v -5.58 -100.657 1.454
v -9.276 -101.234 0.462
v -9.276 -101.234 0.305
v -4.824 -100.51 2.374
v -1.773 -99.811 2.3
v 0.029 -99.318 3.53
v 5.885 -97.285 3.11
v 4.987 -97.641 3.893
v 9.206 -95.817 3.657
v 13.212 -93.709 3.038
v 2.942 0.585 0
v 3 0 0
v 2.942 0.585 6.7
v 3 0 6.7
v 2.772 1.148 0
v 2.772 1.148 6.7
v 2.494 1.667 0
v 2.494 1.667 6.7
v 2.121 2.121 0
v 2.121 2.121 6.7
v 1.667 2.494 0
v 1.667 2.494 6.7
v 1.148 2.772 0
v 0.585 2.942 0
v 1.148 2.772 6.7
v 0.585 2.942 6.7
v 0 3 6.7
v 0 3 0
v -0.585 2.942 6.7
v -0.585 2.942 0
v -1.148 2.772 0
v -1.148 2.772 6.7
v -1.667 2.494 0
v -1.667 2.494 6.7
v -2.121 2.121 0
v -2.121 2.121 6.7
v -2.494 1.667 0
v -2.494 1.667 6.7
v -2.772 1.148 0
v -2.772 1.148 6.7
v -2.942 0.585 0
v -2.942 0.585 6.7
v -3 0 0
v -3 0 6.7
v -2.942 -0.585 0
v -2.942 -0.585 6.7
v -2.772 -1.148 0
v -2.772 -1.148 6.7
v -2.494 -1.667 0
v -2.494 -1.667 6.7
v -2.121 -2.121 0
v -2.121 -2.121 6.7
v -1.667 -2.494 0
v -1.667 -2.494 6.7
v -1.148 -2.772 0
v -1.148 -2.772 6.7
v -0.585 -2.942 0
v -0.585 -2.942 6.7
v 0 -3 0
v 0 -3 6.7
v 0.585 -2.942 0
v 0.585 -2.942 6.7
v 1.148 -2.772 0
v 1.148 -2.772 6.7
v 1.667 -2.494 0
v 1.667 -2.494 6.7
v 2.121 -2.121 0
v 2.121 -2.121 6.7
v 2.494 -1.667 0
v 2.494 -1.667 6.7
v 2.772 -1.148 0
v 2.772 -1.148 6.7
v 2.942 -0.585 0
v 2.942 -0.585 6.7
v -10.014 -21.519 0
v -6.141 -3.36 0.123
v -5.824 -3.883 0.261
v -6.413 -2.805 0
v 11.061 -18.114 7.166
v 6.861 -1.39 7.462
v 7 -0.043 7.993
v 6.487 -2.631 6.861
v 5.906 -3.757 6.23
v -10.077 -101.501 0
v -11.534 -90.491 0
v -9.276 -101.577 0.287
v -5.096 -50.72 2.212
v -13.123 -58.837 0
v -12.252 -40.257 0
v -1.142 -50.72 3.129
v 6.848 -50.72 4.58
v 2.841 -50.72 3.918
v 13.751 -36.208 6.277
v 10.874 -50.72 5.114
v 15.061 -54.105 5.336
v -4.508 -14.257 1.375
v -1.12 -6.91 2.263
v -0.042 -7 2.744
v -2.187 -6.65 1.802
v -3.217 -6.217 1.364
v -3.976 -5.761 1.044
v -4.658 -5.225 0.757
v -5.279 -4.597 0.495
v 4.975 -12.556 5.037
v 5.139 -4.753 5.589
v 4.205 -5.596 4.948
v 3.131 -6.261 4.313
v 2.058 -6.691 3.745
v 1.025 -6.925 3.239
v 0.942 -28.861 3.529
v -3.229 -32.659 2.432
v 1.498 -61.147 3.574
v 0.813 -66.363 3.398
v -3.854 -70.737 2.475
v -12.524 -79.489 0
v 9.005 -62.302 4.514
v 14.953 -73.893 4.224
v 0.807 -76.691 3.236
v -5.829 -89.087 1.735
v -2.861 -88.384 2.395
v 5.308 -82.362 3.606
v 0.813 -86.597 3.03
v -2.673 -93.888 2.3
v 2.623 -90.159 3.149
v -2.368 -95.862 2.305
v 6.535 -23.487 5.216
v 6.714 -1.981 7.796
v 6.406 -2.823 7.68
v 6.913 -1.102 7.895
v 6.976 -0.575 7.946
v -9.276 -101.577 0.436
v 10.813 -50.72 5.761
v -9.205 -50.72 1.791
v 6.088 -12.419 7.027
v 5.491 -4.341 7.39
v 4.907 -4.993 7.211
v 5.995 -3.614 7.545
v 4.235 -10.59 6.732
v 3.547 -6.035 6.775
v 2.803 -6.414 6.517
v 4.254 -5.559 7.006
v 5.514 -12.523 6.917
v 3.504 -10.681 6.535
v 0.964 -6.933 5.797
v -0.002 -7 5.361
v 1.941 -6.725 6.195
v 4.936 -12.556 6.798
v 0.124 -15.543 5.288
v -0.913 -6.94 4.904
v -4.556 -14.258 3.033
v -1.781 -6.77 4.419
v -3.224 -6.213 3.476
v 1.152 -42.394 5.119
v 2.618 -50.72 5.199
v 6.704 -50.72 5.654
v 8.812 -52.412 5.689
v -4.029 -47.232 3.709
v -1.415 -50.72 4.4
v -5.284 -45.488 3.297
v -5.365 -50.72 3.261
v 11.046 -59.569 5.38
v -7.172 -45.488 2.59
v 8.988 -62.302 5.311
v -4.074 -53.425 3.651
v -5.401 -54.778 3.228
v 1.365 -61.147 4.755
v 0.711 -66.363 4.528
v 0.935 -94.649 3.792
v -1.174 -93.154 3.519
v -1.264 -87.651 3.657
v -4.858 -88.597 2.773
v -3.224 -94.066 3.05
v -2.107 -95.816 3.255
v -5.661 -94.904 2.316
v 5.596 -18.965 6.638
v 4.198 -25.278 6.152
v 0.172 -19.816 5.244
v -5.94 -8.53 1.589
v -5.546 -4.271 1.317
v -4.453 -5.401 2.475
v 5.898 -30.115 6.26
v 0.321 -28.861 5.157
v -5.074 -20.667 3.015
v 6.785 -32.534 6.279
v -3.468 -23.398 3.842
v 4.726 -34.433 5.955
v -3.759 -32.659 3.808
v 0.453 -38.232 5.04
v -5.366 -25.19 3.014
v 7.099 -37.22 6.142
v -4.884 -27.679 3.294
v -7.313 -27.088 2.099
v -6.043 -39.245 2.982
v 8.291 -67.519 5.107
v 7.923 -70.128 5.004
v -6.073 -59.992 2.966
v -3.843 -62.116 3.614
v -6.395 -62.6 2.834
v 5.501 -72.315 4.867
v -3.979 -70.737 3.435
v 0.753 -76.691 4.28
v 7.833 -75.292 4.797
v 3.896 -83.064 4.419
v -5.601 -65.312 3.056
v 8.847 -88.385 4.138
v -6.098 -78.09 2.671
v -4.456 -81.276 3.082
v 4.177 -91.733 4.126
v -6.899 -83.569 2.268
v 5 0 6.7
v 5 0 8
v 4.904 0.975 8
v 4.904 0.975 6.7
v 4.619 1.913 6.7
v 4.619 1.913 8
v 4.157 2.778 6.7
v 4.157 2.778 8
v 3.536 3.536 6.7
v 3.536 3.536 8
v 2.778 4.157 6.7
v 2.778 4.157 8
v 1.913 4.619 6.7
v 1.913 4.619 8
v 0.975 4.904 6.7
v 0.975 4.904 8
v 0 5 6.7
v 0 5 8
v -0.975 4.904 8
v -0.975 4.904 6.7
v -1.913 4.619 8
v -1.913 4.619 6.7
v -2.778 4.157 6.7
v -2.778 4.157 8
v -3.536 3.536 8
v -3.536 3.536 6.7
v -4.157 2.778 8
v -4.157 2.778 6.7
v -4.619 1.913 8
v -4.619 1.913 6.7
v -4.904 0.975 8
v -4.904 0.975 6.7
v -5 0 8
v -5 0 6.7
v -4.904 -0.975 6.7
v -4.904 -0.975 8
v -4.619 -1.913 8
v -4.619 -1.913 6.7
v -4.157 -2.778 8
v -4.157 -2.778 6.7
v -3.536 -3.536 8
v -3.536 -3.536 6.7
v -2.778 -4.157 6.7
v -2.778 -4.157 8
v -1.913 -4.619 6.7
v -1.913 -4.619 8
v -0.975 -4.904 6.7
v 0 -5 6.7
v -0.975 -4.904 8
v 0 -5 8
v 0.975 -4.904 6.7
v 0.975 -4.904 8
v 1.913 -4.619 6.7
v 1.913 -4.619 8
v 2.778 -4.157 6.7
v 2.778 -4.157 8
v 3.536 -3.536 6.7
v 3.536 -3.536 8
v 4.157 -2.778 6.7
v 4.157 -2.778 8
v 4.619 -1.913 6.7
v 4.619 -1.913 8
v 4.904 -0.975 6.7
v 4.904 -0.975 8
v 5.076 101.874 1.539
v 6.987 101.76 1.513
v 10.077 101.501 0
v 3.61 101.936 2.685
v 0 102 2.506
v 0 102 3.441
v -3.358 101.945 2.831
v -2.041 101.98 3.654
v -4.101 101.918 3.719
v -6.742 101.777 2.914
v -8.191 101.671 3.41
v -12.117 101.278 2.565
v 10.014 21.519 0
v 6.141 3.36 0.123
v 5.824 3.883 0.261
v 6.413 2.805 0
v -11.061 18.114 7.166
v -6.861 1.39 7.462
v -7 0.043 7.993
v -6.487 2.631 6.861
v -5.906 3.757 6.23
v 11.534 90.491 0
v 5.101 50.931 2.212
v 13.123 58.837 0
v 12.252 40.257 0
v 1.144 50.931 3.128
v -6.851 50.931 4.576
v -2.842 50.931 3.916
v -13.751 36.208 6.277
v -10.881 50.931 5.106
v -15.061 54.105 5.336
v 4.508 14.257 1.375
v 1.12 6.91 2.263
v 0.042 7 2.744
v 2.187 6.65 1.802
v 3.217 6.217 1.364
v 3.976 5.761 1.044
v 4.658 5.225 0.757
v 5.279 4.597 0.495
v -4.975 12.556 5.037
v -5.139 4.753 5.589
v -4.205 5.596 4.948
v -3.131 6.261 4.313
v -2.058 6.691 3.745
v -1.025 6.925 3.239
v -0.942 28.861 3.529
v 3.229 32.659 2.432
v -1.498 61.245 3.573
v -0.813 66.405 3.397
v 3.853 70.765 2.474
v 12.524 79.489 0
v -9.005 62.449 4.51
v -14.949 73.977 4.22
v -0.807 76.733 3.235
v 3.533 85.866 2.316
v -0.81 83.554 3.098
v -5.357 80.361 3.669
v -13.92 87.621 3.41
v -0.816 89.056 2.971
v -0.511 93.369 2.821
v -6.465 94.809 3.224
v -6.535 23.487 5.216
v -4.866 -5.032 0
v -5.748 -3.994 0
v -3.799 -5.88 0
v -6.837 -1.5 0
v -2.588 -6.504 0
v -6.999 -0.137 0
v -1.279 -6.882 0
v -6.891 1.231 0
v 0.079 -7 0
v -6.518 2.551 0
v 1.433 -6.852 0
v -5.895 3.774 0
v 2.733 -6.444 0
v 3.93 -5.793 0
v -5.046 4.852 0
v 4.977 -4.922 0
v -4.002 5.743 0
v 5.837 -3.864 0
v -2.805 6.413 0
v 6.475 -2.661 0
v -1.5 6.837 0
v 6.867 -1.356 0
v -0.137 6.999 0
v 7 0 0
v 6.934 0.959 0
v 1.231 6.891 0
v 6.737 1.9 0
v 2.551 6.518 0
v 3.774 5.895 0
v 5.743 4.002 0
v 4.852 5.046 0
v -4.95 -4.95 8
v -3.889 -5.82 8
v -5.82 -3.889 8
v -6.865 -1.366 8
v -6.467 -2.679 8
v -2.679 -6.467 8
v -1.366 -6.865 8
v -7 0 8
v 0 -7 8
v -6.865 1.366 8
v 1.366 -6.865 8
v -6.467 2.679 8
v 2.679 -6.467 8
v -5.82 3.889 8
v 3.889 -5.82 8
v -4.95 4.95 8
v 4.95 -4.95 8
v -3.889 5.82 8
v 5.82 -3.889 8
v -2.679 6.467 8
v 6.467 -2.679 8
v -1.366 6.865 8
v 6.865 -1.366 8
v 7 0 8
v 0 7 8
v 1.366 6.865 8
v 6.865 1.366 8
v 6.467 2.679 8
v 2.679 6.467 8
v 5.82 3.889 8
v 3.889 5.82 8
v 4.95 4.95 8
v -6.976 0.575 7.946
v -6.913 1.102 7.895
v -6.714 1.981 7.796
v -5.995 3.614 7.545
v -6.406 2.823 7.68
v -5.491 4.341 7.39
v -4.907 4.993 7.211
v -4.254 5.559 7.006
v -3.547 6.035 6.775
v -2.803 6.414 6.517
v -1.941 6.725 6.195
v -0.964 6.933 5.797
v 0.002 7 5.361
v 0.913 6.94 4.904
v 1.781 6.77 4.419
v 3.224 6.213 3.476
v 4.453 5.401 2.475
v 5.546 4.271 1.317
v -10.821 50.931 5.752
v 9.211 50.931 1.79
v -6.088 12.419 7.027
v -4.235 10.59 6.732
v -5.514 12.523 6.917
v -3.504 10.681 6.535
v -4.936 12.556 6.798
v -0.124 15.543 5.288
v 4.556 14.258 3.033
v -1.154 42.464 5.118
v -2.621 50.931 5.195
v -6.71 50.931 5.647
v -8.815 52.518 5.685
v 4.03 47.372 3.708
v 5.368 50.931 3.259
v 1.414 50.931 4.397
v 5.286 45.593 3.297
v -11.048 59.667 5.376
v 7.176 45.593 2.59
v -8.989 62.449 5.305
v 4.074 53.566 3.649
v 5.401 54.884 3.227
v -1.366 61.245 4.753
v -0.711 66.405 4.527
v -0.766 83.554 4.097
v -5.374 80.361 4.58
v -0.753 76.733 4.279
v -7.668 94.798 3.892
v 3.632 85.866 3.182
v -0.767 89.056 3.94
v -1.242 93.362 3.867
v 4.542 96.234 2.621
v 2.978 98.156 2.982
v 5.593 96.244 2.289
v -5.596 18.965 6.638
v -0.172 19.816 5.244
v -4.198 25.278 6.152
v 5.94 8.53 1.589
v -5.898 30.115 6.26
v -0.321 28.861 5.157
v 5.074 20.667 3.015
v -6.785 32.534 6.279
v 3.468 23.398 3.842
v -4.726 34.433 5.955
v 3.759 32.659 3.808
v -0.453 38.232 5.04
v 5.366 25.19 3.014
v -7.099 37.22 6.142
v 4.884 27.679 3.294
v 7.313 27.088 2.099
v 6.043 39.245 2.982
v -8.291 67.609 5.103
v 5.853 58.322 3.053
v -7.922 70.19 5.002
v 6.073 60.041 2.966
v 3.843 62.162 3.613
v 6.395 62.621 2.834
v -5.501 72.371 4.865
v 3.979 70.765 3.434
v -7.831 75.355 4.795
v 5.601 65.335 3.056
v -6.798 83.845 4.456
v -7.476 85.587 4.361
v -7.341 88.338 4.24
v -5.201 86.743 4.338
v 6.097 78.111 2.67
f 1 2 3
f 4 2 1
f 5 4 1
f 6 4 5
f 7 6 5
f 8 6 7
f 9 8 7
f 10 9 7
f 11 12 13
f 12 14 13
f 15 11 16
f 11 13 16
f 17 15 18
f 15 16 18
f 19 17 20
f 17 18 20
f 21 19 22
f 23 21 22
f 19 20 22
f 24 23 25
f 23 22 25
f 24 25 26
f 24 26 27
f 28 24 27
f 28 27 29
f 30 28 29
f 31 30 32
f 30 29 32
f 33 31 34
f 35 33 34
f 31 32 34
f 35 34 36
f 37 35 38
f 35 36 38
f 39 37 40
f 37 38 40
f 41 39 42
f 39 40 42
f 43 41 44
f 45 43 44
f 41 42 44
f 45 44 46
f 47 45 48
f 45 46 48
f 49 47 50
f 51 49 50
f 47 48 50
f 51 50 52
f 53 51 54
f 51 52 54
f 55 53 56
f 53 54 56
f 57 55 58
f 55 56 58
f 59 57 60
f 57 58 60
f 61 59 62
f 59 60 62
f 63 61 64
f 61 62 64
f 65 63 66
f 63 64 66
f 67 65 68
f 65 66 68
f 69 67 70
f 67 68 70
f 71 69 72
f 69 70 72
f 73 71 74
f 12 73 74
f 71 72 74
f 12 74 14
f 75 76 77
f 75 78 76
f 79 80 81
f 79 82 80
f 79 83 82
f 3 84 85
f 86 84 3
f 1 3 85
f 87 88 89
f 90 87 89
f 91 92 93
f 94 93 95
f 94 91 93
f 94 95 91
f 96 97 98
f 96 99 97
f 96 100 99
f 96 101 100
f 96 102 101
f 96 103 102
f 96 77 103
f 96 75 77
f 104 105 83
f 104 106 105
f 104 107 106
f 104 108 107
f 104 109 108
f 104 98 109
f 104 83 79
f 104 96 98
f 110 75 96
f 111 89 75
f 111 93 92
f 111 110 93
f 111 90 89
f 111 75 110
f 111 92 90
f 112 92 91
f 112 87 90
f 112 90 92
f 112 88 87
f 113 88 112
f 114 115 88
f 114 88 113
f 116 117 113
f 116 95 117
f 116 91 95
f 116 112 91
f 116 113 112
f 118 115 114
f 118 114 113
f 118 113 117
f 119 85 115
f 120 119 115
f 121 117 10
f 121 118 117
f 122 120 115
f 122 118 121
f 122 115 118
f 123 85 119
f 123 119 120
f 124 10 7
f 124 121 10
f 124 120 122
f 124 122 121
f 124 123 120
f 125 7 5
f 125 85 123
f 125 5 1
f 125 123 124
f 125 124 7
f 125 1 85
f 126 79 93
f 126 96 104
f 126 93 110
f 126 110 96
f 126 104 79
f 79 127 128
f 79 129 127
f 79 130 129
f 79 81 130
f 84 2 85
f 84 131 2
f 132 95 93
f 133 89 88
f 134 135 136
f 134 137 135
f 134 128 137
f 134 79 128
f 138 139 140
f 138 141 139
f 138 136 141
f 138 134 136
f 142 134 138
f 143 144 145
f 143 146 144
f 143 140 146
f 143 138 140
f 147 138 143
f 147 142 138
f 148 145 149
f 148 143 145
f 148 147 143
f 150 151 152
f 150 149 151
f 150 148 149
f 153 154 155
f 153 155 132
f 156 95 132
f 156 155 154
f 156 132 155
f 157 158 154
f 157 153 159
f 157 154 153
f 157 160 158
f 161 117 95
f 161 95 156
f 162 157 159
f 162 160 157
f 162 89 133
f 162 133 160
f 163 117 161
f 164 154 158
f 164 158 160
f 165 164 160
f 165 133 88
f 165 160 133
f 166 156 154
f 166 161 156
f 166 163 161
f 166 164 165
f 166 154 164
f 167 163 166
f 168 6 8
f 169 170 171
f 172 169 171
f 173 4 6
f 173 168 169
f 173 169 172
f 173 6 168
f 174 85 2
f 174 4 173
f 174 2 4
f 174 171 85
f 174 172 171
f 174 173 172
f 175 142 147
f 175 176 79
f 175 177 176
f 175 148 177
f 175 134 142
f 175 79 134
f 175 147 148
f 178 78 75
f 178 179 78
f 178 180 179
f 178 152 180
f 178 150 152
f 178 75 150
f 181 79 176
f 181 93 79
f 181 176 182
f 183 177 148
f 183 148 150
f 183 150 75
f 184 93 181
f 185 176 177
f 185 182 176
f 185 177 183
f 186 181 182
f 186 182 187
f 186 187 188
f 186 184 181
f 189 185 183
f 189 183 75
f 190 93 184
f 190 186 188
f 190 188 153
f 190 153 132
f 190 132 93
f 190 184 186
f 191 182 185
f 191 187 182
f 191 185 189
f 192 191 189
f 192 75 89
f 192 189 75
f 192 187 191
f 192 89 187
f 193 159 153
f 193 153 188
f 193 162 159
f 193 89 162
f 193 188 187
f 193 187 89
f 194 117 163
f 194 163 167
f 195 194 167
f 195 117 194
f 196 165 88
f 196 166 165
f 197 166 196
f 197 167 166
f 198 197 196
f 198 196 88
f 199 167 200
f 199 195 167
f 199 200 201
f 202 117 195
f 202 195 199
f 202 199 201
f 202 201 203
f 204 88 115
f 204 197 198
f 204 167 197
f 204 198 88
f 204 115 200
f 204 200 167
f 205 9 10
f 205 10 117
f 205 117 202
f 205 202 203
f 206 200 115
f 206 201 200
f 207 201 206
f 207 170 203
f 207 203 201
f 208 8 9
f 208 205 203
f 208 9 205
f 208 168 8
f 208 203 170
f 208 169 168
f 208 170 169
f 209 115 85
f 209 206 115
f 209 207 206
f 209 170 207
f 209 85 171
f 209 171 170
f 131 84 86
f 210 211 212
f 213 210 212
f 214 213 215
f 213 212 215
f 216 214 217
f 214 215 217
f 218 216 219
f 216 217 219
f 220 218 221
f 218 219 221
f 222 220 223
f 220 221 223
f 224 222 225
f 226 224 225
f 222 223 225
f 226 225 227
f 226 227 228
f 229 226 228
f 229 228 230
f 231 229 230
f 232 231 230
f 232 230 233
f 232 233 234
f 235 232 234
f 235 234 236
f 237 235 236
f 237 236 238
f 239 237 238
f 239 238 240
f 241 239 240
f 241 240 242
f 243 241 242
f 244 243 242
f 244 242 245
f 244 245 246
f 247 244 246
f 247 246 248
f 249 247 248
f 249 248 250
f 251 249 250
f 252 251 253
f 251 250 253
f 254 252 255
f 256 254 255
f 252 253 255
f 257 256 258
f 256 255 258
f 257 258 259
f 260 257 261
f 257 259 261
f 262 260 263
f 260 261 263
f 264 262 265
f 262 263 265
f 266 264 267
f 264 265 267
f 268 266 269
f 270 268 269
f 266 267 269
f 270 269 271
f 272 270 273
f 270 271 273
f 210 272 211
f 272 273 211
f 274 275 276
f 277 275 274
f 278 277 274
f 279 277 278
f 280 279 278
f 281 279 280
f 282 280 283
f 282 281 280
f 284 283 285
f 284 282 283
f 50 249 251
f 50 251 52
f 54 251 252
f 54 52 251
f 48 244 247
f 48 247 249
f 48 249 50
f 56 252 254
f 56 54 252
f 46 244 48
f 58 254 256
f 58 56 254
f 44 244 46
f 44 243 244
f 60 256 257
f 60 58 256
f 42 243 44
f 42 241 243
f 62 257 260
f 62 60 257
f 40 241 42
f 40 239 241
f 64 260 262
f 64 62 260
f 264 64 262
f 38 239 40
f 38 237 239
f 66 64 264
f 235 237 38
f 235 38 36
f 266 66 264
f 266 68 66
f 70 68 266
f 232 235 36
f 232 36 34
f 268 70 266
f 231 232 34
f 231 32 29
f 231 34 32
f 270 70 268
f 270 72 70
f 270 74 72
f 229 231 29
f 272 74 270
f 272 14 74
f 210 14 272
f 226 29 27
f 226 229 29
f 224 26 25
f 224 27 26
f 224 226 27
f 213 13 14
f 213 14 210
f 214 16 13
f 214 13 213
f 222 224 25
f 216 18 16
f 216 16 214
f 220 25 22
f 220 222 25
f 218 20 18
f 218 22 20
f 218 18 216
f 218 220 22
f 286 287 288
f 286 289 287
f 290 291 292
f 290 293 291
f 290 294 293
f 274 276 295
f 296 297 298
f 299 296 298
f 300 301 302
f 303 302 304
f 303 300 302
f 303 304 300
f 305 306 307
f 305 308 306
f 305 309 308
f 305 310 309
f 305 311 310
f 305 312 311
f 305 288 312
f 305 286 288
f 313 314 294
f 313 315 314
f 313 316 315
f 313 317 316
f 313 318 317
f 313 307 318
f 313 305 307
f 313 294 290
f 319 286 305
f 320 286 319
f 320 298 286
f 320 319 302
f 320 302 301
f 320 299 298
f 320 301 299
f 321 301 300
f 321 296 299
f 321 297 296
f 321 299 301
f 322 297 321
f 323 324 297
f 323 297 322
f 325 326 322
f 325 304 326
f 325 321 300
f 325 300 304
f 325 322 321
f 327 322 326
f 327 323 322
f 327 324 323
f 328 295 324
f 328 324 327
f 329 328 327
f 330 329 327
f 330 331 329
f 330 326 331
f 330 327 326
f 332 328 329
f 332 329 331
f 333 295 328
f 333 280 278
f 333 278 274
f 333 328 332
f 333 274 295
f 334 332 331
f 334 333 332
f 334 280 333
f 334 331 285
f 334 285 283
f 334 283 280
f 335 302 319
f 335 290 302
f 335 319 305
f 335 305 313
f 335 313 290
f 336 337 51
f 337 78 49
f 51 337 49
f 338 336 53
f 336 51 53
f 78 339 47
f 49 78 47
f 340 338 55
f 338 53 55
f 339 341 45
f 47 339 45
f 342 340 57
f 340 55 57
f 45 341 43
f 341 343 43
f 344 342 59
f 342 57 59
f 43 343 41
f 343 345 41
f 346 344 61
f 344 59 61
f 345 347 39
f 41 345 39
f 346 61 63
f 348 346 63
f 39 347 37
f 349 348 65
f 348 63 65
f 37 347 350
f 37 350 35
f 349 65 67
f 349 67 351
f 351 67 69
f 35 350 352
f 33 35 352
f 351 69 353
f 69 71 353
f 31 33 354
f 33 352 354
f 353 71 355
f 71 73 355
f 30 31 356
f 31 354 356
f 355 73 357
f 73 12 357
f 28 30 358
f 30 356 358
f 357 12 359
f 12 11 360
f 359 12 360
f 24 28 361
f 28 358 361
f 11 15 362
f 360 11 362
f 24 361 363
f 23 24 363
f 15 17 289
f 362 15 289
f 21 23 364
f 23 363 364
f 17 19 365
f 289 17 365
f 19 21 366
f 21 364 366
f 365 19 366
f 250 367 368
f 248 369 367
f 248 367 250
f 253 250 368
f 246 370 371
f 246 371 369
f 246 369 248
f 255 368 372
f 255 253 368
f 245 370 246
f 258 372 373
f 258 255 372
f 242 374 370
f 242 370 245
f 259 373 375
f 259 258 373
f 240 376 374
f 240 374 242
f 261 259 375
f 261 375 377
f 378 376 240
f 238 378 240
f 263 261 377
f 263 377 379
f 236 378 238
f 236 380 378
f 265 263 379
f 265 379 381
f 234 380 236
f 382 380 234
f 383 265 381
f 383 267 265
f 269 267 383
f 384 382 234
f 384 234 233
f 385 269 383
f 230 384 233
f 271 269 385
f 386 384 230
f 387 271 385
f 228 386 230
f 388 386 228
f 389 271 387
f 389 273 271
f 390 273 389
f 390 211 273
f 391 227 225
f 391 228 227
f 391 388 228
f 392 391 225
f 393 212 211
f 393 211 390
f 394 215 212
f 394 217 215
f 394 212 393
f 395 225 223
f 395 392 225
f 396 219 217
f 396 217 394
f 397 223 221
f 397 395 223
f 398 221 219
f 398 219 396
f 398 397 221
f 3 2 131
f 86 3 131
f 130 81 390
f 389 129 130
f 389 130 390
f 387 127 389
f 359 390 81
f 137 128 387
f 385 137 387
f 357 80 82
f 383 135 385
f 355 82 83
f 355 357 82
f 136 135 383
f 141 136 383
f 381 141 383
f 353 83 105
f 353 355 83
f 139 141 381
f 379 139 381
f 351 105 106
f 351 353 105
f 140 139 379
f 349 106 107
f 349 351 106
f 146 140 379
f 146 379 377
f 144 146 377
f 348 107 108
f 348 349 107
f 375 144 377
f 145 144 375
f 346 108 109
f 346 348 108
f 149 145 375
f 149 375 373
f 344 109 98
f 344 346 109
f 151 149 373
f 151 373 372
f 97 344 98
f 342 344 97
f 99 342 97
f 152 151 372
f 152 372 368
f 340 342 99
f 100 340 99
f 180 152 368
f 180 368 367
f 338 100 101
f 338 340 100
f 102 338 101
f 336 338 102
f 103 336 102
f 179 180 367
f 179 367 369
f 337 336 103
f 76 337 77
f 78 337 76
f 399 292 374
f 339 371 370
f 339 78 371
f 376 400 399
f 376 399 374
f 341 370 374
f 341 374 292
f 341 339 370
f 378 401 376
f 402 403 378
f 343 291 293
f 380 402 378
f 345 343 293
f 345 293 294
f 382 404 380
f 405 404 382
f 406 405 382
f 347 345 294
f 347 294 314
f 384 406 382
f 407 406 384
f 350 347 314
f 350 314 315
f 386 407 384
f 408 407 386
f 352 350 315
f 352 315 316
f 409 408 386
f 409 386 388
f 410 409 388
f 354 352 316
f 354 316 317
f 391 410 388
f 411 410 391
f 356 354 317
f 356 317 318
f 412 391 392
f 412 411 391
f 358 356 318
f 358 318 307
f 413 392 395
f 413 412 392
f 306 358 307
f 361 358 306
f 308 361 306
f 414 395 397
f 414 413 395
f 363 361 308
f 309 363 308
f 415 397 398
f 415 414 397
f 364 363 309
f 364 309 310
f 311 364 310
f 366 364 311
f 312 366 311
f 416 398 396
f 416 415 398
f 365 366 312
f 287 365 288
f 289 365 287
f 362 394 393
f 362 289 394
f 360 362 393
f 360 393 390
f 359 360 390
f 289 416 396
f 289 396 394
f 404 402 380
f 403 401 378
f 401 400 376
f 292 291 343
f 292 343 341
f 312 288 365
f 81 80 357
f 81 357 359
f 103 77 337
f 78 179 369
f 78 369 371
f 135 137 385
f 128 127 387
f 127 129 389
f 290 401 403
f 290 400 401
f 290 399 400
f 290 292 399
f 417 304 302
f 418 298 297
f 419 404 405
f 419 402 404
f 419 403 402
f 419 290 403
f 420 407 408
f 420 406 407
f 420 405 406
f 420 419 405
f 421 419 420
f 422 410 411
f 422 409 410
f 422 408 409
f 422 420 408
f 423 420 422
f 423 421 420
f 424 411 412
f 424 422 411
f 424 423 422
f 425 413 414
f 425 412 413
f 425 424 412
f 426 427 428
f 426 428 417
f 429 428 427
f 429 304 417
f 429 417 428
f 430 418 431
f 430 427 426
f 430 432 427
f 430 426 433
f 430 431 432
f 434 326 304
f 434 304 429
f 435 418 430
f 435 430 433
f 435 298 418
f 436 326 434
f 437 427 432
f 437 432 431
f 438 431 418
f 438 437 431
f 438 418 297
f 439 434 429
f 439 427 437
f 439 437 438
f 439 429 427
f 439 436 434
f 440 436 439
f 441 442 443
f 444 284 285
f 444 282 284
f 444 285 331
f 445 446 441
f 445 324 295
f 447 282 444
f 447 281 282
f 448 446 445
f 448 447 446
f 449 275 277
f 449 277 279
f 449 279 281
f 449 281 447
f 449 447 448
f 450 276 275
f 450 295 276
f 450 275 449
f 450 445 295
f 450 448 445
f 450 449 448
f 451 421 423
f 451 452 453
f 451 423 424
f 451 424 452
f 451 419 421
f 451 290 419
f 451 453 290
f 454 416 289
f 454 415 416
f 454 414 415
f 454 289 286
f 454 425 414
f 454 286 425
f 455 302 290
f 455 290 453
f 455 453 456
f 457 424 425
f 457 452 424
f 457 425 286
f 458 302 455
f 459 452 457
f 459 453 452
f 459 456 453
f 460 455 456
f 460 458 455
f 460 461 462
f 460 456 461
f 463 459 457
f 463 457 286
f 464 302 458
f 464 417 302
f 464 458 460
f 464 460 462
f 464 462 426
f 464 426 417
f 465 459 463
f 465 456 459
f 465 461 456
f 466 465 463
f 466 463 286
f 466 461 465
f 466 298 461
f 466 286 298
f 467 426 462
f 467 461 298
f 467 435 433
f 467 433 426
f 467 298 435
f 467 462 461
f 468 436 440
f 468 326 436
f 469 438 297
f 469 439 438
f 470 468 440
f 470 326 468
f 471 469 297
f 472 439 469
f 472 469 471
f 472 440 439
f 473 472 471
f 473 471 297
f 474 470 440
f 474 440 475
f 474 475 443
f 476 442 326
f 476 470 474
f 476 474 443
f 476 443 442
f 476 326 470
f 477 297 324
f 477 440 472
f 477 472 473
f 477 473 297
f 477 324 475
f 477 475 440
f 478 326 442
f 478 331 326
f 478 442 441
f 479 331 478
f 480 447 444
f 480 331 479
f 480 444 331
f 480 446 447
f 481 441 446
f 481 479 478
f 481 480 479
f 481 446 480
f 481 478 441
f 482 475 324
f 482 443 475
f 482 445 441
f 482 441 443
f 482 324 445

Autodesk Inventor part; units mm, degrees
ref_plane "YZ Plane" through (0, 0, 0) normal (1, 0, 0) x (0, 1, 0)
sketch "Sketch1" plane through (0, 0, 0) normal (0, 0, 1) x (1, 0, 0)
  circle A0 centre (0, 0) radius 7
  dimension "d0" = 14
extrude "Extrusion1" add sketch "Sketch1" along normal blind 8
sketch "Sketch2" plane through (0, 0, 8) normal (0, 0, 1) x (1, 0, 0)
  circle A0 centre (0, 0) radius 7 projected
  circle A1 centre (0, 0) radius 3
  dimension "d3" = 6
sketch "Sketch5" plane through (0, 0, 0) normal (0, 1, 0) x (-1, 0, 0)
  arc A0 (6.9886, 7.9945) -> (-5.7555, 0) centre (9.6228, -10.3597) ccw
  arc A1 (-5.7555, 0) -> (6.9886, 7.9945) centre (-13.9623, 27.2376) ccw
  point P0 (0, 0)
ref_plane "Work Plane1" through (0, 102, 0) normal (0, 1, 0) x (-1, 0, 0)
sketch "Sketch7" plane through (0, 102, 0) normal (0, 1, 0) x (-1, 0, 0)
  arc A0 (12, 2.5195) -> (-10, 0) centre (3.9145, -24.1892) ccw
  arc A1 (12, 2.5195) -> (-10, 0) centre (6.0497, -42.8334) ccw
  point P0 (0, 0)
  dimension "d32" = 12
  dimension "d33" = 10
  dimension "d34" = 0
ref_plane "Work Plane2" through (0, 50, 0) normal (0, 1, 0) x (-1, 0, 0)
sketch "Sketch8" plane through (0, 50, 0) normal (0, 1, 0) x (-1, 0, 0)
  arc A0 (14.8793, 5.5568) -> (-12.8755, 0) centre (10.0783, -42.5555) ccw
  arc A1 (14.8793, 5.5568) -> (-12.8755, 0) centre (26.1398, -122.7786) ccw
  point P0 (0, 0)
loft "Loft1" add profiles "Sketch5", "Sketch8", "Sketch7"
pattern_circular "Circular Pattern1" count 2 over 360 about axis through (0, 0, -10) along (0, 0, 1) of "Loft1"
sketch "Sketch10" plane through (0, 0, 8) normal (0, 0, 1) x (1, 0, 0)
  circle A0 centre (0, 0) radius 7 projected
  circle A1 centre (0, 0) radius 102
  circle A2 centre (0, 0) radius 119.0756
  dimension "d25" = 204
extrude "Extrusion4" cut sketch "Sketch10" against normal through all contours A2
sketch "Sketch11" plane through (0, 0, 8) normal (0, 0, 1) x (1, 0, 0)
  arc A0 (-9.2755, -101.2344) -> (21.1659, -88.2344) centre (-16.6676, -41.7833) ccw
  line L0 (21.1659, -88.2344) -> (21.1659, -103.2344)
  line L1 (21.1659, -103.2344) -> (-9.2755, -103.2344)
  line L2 (-9.2755, -101.2344) -> (-9.2755, -103.2344)
  dimension "d28" = 15
  dimension "d29" = 2
extrude "Extrusion5" cut sketch "Sketch11" against normal through all
sketch "Sketch3" plane through (0, 0, 8) normal (0, 0, 1) x (1, 0, 0)
  circle A0 centre (0, 0) radius 3 projected
  circle A1 centre (0, 0) radius 7 projected
  circle A2 centre (0, 0) radius 5
  dimension "d6" = 10
extrude "Extrusion6" cut sketch "Sketch3" against normal through all contours A0
sketch "Sketch12" plane through (0, 0, 8) normal (0, 0, 1) x (1, 0, 0)
  circle A0 centre (0, 0) radius 3 projected
  circle A1 centre (0, 0) radius 7 projected
  circle A2 centre (0, 0) radius 5
  dimension "d37" = 10
extrude "Extrusion7" cut sketch "Sketch12" against normal blind 1.3 contours A2
properties part number "prop"
